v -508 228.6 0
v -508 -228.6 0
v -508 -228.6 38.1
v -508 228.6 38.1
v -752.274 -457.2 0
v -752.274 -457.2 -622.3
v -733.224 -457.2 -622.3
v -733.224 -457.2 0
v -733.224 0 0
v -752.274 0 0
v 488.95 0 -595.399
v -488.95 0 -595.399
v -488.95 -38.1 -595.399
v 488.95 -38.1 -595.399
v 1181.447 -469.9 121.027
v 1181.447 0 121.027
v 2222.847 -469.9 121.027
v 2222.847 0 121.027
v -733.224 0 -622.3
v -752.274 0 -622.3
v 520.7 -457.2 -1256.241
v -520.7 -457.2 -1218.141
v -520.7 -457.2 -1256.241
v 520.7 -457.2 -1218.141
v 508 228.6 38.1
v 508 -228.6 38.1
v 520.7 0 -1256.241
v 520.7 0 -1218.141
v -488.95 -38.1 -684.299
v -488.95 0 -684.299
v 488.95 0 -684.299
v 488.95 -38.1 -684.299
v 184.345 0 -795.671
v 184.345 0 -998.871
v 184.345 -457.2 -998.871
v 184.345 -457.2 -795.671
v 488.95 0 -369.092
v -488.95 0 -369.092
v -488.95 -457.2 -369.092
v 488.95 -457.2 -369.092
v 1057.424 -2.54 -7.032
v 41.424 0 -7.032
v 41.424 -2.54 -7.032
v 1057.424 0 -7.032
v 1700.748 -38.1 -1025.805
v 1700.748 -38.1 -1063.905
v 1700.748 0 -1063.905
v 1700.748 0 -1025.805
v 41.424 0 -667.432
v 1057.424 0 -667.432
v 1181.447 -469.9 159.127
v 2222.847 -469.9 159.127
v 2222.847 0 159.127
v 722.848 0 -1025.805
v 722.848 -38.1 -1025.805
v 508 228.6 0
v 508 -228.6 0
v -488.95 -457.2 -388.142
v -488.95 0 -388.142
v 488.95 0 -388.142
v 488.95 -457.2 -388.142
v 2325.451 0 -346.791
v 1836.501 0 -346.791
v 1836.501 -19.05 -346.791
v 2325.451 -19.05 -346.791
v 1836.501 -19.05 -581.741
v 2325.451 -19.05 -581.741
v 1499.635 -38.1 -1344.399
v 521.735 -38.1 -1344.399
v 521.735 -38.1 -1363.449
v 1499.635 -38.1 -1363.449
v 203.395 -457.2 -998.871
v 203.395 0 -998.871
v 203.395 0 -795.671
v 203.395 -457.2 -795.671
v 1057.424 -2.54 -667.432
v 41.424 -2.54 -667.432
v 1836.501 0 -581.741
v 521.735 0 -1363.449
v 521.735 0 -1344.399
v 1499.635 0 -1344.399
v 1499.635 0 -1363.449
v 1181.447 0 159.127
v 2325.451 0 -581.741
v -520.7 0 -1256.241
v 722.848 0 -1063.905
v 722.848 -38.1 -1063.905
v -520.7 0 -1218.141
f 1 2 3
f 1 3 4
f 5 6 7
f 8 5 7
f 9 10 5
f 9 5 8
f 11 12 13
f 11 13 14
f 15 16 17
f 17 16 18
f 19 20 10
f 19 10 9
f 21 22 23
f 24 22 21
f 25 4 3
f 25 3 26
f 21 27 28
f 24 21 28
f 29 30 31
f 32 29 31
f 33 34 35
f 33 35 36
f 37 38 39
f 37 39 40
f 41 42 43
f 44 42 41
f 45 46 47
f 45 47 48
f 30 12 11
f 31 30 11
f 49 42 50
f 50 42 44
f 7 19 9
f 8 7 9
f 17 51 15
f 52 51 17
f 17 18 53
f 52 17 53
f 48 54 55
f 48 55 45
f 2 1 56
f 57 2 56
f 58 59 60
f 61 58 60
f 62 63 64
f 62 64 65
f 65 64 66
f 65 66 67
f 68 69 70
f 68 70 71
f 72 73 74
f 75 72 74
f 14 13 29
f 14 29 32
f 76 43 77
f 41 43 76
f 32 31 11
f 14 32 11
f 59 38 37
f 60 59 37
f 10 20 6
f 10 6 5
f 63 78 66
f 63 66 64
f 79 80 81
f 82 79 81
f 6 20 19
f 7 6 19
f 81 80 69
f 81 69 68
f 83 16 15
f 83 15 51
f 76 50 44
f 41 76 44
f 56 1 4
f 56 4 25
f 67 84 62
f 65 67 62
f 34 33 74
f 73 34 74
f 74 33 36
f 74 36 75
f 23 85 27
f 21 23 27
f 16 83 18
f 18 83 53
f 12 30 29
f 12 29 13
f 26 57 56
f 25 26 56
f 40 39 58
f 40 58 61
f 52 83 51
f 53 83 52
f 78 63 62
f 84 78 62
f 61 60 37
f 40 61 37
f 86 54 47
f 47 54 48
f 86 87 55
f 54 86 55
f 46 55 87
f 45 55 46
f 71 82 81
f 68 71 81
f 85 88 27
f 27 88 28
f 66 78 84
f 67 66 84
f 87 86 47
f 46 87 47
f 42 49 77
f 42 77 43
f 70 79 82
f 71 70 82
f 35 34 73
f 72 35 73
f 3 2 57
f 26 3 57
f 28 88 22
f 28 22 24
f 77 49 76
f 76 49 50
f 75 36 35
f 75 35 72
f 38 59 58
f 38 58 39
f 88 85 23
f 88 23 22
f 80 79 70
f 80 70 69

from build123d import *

# Parameters (mm, degrees)
F0_W      = 1016
F0_H      = 457.2
F1_DEPTH  = 38.1
F2_W      = 19.05
F2_H      = 622.3
F3_DEPTH  = 457.2
F4_W      = 977.9
F4_H      = 19.05
F5_DEPTH  = 457.2
F6_W      = 977.9
F6_H      = 88.9
F7_DEPTH  = 38.1
F8_W      = 1016
F8_H      = 660.4
F9_DEPTH  = 2.54
F10_W     = 19.05
F10_H     = 203.2
F11_DEPTH = 457.2
F12_W     = 1041.4
F12_H     = 38.1
F13_DEPTH = 457.2
F14_W     = 977.9
F14_H     = 38.1
F15_DEPTH = 38.1
F16_W     = 977.9
F16_H     = 19.05
F17_DEPTH = 38.1
F18_W     = 488.95
F18_H     = 234.95
F19_DEPTH = 19.05
F20_W     = 1041.4
F20_H     = 38.1
F21_DEPTH = 469.9


with BuildPart() as f1:
    # F0 (on Top) → F1 (new body)
    with BuildSketch(Plane.XY):
        Rectangle(F0_W, F0_H)
    extrude(amount=F1_DEPTH)


with BuildPart() as f3:
    # F2 (on Front) → F3 (new body)
    with BuildSketch(Plane.XZ):
        with Locations((-742.749031, -311.15)):
            Rectangle(F2_W, F2_H)
    extrude(amount=F3_DEPTH)


with BuildPart() as f5:
    # F4 (on Front) → F5 (new body)
    with BuildSketch(Plane.XZ):
        with Locations((0, -378.617166)):
            Rectangle(F4_W, F4_H)
    extrude(amount=F5_DEPTH)


with BuildPart() as f7:
    # F6 (on Front) → F7 (new body)
    with BuildSketch(Plane.XZ):
        with Locations((0, -639.848528)):
            Rectangle(F6_W, F6_H)
    extrude(amount=F7_DEPTH)


with BuildPart() as f9:
    # F8 (on Front) → F9 (new body)
    with BuildSketch(Plane.XZ):
        with Locations((549.424427, -337.231815)):
            Rectangle(F8_W, F8_H)
    extrude(amount=F9_DEPTH)


with BuildPart() as f11:
    # F10 (on Front) → F11 (new body)
    with BuildSketch(Plane.XZ):
        with Locations((193.870118, -897.270501)):
            Rectangle(F10_W, F10_H)
    extrude(amount=F11_DEPTH)


with BuildPart() as f13:
    # F12 (on Front) → F13 (new body)
    with BuildSketch(Plane.XZ):
        with Locations((0, -1237.190702)):
            Rectangle(F12_W, F12_H)
    extrude(amount=F13_DEPTH)


with BuildPart() as f15:
    # F14 (on Front) → F15 (new body)
    with BuildSketch(Plane.XZ):
        with Locations((1211.797714, -1044.854864)):
            Rectangle(F14_W, F14_H)
    extrude(amount=F15_DEPTH)


with BuildPart() as f17:
    # F16 (on Front) → F17 (new body)
    with BuildSketch(Plane.XZ):
        with Locations((1010.684609, -1353.92351)):
            Rectangle(F16_W, F16_H)
    extrude(amount=F17_DEPTH)


with BuildPart() as f19:
    # F18 (on Front) → F19 (new body)
    with BuildSketch(Plane.XZ):
        with Locations((2080.975597, -464.266121)):
            Rectangle(F18_W, F18_H)
    extrude(amount=F19_DEPTH)


with BuildPart() as f21:
    # F20 (on Front) → F21 (new body)
    with BuildSketch(Plane.XZ):
        with Locations((1702.146649, 140.076977)):
            Rectangle(F20_W, F20_H)
    extrude(amount=F21_DEPTH)


solid = Compound([f1.part, f3.part, f5.part, f7.part, f9.part, f11.part, f13.part, f15.part, f17.part, f19.part, f21.part])
